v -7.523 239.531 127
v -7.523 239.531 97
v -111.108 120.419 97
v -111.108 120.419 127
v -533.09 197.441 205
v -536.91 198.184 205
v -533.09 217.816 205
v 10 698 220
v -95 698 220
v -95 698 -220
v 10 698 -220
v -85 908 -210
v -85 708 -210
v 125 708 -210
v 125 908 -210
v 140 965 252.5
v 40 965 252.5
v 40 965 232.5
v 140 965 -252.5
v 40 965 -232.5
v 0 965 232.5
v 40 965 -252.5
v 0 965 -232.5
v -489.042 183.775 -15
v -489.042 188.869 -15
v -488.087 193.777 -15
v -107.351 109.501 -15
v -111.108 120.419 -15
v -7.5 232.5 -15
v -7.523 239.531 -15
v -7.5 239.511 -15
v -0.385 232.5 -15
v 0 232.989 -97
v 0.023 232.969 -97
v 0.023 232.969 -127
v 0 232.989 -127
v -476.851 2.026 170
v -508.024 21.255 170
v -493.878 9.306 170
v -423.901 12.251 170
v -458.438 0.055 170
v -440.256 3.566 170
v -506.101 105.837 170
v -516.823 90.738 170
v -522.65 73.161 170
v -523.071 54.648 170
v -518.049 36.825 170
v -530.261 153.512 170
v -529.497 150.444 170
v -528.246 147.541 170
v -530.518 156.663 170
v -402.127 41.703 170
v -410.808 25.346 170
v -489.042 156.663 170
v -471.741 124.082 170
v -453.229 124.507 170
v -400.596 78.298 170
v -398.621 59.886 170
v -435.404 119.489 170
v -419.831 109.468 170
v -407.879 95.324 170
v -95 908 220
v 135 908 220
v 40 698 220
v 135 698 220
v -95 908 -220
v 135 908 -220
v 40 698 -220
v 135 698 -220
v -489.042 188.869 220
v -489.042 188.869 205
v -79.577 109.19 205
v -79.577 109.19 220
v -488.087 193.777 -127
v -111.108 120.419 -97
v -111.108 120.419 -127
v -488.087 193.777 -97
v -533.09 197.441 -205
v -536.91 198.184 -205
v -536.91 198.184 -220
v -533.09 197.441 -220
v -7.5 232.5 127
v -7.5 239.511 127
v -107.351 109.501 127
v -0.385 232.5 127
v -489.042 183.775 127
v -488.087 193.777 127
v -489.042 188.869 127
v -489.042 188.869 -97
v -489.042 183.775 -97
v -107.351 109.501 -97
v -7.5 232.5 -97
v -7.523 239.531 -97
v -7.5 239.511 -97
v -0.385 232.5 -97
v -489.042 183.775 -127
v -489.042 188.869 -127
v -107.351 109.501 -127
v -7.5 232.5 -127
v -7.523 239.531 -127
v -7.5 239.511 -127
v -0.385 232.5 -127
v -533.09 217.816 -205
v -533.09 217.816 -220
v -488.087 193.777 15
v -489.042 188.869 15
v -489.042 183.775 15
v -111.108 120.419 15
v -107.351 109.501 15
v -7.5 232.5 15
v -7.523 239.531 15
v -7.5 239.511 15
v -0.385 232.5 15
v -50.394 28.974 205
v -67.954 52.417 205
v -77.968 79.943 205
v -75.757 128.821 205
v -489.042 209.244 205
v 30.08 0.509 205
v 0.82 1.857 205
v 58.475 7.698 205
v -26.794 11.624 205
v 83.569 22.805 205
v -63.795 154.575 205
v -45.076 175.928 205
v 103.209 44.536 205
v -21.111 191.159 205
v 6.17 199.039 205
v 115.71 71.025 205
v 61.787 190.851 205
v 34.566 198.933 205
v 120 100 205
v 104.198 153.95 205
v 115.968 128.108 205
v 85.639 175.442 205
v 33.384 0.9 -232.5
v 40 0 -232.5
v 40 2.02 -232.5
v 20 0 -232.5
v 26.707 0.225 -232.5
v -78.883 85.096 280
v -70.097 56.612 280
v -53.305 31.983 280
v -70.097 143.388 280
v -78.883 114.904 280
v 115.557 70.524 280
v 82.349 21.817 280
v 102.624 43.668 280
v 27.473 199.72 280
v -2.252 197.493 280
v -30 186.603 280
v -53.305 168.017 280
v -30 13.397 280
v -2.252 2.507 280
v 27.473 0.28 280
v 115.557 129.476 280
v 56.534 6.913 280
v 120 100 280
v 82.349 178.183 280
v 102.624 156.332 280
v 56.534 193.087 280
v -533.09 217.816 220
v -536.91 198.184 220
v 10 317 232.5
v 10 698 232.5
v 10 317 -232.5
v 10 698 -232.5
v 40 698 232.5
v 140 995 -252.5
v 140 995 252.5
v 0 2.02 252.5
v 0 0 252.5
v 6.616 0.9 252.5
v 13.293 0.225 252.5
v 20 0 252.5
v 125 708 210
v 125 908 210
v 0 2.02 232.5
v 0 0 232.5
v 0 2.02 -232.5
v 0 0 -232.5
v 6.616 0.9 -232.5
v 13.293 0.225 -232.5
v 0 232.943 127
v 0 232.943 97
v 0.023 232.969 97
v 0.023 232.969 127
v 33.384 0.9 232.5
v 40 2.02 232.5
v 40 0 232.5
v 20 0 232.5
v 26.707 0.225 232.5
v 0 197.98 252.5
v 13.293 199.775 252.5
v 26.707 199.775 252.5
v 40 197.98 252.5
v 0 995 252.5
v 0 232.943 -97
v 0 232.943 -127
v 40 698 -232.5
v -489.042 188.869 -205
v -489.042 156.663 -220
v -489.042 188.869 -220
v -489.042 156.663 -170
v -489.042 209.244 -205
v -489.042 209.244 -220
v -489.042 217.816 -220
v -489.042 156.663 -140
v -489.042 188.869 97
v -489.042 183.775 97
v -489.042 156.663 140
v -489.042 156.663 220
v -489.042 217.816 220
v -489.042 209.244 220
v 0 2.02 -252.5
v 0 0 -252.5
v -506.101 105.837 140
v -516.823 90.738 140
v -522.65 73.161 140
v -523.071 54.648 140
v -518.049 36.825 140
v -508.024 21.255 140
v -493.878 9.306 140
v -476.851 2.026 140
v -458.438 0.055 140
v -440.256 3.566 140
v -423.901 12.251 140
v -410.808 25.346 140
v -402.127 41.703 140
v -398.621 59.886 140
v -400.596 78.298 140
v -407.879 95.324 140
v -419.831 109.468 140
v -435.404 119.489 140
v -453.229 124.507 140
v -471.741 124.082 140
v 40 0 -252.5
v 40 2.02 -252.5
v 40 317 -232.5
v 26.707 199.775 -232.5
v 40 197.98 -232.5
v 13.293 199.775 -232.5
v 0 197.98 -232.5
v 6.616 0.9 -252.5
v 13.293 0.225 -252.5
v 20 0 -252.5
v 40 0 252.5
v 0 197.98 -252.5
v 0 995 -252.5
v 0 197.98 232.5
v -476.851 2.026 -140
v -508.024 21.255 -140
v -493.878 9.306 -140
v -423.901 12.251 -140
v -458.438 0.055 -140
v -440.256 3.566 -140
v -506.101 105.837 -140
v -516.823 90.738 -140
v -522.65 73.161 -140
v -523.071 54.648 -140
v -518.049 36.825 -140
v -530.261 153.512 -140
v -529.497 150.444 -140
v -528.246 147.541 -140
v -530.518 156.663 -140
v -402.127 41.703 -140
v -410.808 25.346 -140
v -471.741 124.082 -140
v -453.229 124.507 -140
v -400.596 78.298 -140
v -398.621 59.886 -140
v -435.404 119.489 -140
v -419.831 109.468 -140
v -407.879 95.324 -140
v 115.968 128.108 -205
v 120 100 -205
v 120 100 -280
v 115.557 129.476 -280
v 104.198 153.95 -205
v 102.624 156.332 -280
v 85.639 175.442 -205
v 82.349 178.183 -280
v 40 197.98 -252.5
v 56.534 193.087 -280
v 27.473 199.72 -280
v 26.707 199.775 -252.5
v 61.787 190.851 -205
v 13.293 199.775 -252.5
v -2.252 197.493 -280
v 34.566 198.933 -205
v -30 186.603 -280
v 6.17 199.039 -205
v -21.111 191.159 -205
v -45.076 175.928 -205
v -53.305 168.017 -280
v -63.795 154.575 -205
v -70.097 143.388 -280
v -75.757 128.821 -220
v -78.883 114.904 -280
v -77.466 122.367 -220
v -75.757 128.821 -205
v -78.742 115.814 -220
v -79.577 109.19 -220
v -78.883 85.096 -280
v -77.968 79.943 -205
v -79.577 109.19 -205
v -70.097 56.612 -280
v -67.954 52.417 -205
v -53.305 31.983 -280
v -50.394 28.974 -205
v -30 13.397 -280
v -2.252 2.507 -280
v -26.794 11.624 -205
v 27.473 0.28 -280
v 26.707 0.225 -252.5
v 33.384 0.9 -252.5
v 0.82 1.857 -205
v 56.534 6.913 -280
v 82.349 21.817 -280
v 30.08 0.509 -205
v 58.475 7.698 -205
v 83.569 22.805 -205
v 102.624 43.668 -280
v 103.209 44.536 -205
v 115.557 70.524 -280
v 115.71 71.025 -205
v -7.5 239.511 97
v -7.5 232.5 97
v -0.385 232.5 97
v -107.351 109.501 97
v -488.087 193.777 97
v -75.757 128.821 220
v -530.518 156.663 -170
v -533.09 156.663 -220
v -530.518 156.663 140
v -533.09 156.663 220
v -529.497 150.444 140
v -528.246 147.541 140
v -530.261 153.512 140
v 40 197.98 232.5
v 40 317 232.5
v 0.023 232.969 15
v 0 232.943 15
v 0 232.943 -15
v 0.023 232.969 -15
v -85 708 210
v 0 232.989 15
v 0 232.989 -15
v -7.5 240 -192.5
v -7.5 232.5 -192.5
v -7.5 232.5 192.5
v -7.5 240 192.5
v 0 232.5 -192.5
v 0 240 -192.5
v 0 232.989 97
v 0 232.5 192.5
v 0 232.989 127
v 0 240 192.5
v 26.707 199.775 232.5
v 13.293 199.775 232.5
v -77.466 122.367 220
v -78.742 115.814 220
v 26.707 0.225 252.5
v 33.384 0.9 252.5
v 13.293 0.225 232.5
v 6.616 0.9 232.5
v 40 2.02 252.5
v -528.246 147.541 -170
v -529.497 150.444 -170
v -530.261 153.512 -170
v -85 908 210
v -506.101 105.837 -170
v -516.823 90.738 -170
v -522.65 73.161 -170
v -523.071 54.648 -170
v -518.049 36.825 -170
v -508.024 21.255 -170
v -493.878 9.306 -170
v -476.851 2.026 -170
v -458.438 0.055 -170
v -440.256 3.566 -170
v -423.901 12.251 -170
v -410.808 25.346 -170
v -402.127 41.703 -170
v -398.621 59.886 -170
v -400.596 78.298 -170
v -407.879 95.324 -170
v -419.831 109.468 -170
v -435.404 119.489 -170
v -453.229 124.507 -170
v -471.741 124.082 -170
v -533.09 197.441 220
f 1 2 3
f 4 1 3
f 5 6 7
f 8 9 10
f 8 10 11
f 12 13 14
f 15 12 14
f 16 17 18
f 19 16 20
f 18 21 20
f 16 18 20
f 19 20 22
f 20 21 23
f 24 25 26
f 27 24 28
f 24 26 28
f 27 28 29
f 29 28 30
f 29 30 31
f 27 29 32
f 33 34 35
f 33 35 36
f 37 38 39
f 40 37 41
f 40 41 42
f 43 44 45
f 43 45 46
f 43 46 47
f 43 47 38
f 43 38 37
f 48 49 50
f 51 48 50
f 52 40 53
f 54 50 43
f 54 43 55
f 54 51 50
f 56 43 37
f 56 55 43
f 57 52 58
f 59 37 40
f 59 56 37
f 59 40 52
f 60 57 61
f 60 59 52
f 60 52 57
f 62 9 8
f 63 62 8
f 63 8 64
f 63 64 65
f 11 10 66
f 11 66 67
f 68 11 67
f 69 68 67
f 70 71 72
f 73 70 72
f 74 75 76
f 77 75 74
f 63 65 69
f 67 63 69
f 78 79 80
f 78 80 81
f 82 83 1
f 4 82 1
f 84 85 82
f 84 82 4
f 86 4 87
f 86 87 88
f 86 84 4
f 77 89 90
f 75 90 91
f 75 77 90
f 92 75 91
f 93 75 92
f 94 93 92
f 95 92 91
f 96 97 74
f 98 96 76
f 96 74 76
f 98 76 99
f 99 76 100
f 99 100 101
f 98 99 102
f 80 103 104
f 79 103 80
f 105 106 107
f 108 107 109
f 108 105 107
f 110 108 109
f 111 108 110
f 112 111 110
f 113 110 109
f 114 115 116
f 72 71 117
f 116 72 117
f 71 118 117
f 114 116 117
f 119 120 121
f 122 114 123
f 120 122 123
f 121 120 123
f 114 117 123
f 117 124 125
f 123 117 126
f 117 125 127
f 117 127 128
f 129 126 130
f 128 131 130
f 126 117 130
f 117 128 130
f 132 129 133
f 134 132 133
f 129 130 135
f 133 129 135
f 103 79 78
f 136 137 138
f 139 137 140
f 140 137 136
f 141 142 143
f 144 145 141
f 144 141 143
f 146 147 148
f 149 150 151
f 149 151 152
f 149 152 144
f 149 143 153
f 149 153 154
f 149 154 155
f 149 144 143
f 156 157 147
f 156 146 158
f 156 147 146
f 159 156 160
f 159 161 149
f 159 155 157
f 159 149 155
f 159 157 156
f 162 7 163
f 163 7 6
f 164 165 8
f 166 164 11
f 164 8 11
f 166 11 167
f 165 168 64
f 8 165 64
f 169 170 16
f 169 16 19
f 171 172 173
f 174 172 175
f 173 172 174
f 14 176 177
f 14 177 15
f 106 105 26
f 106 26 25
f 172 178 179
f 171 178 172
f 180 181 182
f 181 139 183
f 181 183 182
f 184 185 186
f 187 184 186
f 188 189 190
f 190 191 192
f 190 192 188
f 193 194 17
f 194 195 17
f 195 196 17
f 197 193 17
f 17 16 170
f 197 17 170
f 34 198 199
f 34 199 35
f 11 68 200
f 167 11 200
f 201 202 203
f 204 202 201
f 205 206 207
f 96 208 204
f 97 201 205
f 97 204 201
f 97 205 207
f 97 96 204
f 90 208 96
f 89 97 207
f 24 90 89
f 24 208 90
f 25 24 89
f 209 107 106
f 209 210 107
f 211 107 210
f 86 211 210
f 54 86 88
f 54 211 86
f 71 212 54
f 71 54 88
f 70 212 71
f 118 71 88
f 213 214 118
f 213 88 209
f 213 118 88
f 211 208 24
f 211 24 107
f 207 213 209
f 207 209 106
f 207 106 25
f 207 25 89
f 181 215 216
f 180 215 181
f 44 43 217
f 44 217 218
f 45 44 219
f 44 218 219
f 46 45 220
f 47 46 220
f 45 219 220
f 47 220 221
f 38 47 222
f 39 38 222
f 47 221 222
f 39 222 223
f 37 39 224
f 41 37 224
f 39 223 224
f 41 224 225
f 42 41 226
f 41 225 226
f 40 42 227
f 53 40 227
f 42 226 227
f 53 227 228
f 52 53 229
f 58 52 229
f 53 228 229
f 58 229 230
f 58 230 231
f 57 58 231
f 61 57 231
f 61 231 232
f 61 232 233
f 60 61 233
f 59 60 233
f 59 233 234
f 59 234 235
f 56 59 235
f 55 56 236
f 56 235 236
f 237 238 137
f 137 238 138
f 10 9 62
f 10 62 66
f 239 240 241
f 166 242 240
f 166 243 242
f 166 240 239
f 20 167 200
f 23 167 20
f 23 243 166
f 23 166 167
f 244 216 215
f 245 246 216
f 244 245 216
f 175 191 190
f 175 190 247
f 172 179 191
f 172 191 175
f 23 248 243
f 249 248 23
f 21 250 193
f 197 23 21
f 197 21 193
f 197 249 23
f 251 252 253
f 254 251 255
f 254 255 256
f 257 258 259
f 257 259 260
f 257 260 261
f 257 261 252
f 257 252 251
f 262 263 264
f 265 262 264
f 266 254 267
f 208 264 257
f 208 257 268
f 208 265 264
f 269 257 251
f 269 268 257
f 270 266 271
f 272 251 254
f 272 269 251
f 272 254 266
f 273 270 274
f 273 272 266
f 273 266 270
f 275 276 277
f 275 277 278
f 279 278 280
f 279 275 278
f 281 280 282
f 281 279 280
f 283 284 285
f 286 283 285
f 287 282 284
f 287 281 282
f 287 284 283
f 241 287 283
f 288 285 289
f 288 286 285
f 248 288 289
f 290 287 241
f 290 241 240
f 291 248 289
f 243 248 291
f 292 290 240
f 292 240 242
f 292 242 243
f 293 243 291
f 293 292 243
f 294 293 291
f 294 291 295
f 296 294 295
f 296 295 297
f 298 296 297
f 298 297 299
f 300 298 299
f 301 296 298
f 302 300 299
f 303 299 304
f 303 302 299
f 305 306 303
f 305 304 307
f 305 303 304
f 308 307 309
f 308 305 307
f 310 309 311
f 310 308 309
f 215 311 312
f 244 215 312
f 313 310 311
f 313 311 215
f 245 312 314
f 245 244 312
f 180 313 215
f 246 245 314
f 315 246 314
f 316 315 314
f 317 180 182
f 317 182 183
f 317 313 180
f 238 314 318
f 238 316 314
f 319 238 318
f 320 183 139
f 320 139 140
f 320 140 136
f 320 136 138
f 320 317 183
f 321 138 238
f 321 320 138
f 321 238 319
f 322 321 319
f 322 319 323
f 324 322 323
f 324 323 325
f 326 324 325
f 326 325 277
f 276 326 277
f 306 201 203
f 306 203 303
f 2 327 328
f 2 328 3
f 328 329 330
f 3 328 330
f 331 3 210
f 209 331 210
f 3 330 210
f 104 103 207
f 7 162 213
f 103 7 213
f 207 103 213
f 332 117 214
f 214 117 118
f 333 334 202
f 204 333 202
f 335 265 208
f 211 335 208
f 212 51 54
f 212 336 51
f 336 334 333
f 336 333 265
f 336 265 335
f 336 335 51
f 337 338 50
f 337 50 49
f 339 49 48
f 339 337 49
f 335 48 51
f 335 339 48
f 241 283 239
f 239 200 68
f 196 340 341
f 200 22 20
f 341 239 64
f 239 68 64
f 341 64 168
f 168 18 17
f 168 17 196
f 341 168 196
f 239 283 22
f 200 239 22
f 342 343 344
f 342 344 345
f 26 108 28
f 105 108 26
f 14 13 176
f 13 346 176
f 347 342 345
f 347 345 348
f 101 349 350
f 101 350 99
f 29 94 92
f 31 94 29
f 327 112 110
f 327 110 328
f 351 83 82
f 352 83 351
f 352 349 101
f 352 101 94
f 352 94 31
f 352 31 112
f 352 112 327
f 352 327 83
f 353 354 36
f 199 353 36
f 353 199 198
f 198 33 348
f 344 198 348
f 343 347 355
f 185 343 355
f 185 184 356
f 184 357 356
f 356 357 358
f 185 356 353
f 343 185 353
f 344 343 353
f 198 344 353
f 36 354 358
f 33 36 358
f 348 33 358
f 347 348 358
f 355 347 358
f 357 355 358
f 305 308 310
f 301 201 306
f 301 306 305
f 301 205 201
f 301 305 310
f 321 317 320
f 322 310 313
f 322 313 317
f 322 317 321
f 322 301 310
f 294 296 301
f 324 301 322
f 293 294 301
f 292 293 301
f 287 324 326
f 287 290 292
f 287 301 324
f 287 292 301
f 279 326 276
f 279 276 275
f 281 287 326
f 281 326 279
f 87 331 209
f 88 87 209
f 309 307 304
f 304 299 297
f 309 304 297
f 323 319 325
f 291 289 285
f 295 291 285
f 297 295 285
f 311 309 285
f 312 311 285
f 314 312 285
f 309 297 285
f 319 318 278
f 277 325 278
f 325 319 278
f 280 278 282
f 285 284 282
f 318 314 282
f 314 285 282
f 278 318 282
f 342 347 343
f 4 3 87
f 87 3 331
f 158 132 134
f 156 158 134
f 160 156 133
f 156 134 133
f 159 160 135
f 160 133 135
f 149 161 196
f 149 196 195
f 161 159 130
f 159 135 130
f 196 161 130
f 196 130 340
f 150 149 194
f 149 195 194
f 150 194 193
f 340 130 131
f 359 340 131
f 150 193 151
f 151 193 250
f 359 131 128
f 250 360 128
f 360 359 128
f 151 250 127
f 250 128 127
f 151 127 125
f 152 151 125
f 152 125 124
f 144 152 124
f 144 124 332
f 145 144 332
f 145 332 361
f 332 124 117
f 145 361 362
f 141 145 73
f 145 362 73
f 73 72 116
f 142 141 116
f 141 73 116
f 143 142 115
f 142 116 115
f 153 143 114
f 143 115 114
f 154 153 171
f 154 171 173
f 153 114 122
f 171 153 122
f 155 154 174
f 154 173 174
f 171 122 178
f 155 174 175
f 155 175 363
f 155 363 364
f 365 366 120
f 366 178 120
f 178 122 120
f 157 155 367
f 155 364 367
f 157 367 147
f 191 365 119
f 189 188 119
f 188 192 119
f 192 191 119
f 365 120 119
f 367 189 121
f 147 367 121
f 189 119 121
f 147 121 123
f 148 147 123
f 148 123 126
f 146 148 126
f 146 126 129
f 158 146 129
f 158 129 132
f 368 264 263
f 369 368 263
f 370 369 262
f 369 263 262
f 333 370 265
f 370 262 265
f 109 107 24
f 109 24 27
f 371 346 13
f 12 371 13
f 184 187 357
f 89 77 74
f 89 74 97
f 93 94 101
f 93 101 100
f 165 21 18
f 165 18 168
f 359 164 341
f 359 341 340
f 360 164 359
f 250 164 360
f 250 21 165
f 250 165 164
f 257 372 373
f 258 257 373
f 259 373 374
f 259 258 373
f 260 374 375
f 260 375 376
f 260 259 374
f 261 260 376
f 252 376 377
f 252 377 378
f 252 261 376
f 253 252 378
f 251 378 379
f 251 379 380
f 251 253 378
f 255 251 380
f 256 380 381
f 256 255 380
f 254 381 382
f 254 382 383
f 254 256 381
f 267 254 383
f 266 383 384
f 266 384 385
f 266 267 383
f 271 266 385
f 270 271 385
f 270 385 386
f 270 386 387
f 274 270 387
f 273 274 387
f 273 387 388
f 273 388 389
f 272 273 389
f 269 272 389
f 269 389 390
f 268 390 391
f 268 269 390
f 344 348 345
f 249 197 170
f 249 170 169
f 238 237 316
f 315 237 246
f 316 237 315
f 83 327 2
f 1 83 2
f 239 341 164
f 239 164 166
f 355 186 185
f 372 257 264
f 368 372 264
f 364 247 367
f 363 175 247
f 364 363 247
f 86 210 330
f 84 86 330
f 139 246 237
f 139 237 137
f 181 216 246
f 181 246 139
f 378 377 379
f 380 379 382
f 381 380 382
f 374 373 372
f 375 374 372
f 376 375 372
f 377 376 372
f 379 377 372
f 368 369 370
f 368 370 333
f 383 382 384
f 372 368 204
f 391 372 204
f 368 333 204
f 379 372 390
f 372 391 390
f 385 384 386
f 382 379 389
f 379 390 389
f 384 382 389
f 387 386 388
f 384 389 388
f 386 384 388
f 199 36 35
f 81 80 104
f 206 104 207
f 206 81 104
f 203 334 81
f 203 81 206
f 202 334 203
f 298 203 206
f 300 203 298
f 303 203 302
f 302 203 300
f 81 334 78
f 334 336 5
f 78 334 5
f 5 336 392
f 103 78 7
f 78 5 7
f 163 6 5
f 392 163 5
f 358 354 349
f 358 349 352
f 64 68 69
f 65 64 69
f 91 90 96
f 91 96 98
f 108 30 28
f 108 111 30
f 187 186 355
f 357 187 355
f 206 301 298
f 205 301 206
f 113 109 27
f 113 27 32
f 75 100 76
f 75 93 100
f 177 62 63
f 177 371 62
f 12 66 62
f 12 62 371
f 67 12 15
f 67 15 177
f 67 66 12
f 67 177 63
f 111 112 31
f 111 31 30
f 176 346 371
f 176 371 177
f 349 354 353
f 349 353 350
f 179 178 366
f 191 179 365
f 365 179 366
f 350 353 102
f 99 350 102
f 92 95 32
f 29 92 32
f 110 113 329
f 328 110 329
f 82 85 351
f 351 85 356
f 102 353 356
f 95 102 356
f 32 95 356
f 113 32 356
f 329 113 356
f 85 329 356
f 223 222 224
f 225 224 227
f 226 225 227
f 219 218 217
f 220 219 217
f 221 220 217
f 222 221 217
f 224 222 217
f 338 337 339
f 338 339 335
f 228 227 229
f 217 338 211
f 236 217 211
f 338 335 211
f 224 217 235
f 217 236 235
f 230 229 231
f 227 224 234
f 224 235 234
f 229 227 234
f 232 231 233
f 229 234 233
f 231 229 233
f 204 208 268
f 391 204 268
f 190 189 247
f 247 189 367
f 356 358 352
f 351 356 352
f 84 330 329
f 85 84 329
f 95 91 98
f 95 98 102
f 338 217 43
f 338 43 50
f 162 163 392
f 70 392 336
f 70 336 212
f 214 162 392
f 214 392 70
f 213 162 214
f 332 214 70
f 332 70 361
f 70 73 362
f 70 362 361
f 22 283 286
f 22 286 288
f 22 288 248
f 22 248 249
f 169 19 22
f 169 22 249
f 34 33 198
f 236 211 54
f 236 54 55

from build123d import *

# Parameters (mm, degrees)
BOSS_EXTRUDE1_DEPTH  = 40
SKETCH3_W            = 505
SKETCH3_H            = 30
BOSS_EXTRUDE2_DEPTH  = 100
BOSS_EXTRUDE3_START  = 205
SKETCH5_R            = 100
BOSS_EXTRUDE3_DEPTH  = 75
BOSS_EXTRUDE4_START  = -205
SKETCH5_2_R          = 100
BOSS_EXTRUDE4_DEPTH  = 75
SKETCH7_W            = 505
SKETCH7_H            = 381
BOSS_EXTRUDE5_DEPTH  = 30
SKETCH8_W            = 230
SKETCH8_H            = 440
SKETCH8_W_2          = 210
SKETCH8_H_2          = 420
EXTRUDE_THIN1_DEPTH  = 210
SKETCH9_W            = 230
SKETCH9_H            = 440
BOSS_EXTRUDE6_DEPTH  = 10
SKETCH10_W           = 505
SKETCH10_H           = 7.5
BOSS_EXTRUDE7_DEPTH  = 7.5
BOSS_EXTRUDE8_START  = 205
BOSS_EXTRUDE8_DEPTH  = 15
BOSS_EXTRUDE9_START  = -205
BOSS_EXTRUDE9_DEPTH  = 15
BOSS_EXTRUDE10_REACH = 1238.243
SKETCH12_W           = 44.047720934
SKETCH12_H           = 61.152550191
BOSS_EXTRUDE11_START = 140
SKETCH13_R           = 62.5
BOSS_EXTRUDE11_DEPTH = 30
BOSS_EXTRUDE12_START = -140
SKETCH13_4_R         = 62.5
BOSS_EXTRUDE12_DEPTH = 30
EXTRUDE_THIN5_DEPTH  = 15
LPATTERN1_COUNT      = 2
LPATTERN1_PITCH      = 112
SKETCH15_W           = 7.5
SKETCH15_H           = 7.5
CUT_EXTRUDE1_DEPTH   = 60
MIRROR1_COPY_1_DEPTH = 15
MIRROR1_COPY_2_DEPTH = 15


with BuildPart() as part:
    # Sketch1 → Boss-Extrude1 (new body)
    with BuildSketch(Plane(origin=(0, 0, 0), x_dir=(0, 0, -1), z_dir=(1, 0, 0))):
        Polygon((-232.5, 0), (-252.5, 0), (-252.5, 995), (252.5, 995), (252.5, 0), (232.5, 0), (232.5, 965), (-232.5, 965), align=None)
    extrude(amount=BOSS_EXTRUDE1_DEPTH)

    # Sketch3 → Boss-Extrude2 (add)
    with BuildSketch(Plane(origin=(40, 0, 0), x_dir=(0, 0, -1), z_dir=(1, 0, 0))):
        with Locations((0, 980)):
            Rectangle(SKETCH3_W, SKETCH3_H)
    extrude(amount=BOSS_EXTRUDE2_DEPTH)

    # Sketch5<2> → Boss-Extrude4 (add)
    with BuildSketch(Plane.XY.offset(BOSS_EXTRUDE4_START)):
        with Locations((20, 100)):
            Circle(SKETCH5_2_R)
    extrude(amount=-BOSS_EXTRUDE4_DEPTH)

    # Sketch7 → Boss-Extrude5 (add)
    with BuildSketch(Plane(origin=(40, 0, 0), x_dir=(0, 0, -1), z_dir=(1, 0, 0))):
        with Locations((0, 507.5)):
            Rectangle(SKETCH7_W, SKETCH7_H)
    extrude(amount=-BOSS_EXTRUDE5_DEPTH)

    # Sketch8 → Extrude-Thin1 (add)
    with BuildSketch(Plane(origin=(0, 698, 0), x_dir=(1, 0, 0), z_dir=(0, 1, 0))):
        with Locations((20, 0)):
            Rectangle(SKETCH8_W, SKETCH8_H)
        with Locations((20, 0)):
            Rectangle(SKETCH8_W_2, SKETCH8_H_2, mode=Mode.SUBTRACT)
    extrude(amount=EXTRUDE_THIN1_DEPTH)

    # Sketch9 → Boss-Extrude6 (add)
    with BuildSketch(Plane.XZ.offset(-698)):
        with Locations((20, 0)):
            Rectangle(SKETCH9_W, SKETCH9_H)
    extrude(amount=-BOSS_EXTRUDE6_DEPTH)

    # Sketch10 → Boss-Extrude7 (add)
    with BuildSketch(Plane.ZY):
        with Locations((0, 236.25)):
            Rectangle(SKETCH10_W, SKETCH10_H)
    extrude(amount=BOSS_EXTRUDE7_DEPTH)


with BuildPart() as body_2:
    # Sketch5 → Boss-Extrude3 (new body)
    with BuildSketch(Plane.XY.offset(BOSS_EXTRUDE3_START)):
        with Locations((20, 100)):
            Circle(SKETCH5_R)
    extrude(amount=BOSS_EXTRUDE3_DEPTH)


    add(part.part)  # Boss-Extrude8 merges part
    # Sketch11 → Boss-Extrude8 (add)
    with BuildSketch(Plane.XY.offset(BOSS_EXTRUDE8_START)):
        Polygon((21.910116732, 109.815877652), (-533.089883268, 217.815877652), (-536.910116732, 198.184122348), (18.089883268, 90.184122348), align=None)
    extrude(amount=BOSS_EXTRUDE8_DEPTH)

    # Sketch11<2> → Boss-Extrude9 (add)
    with BuildSketch(Plane.XY.offset(BOSS_EXTRUDE9_START)):
        Polygon((21.910116732, 109.815877652), (-533.089883268, 217.815877652), (-536.910116732, 198.184122348), (18.089883268, 90.184122348), align=None)
    extrude(amount=-BOSS_EXTRUDE9_DEPTH)

    # Boss-Extrude10: up to this face of the body (flat: up to its plane)
    boss_extrude10_end = Plane(body_2.part.faces().sort_by_distance((-306.497442612, 163.534637481, -220))[0])
    # Sketch12 → Boss-Extrude10 (add, up to the picked face)
    with BuildSketch(Plane.XY.offset(220), mode=Mode.PRIVATE) as boss_extrude10_sk1:
        with Locations((-511.066022801, 187.239602557)):
            Rectangle(SKETCH12_W, SKETCH12_H)
    boss_extrude10_tool1 = split(extrude(boss_extrude10_sk1.sketch, amount=-BOSS_EXTRUDE10_REACH, mode=Mode.PRIVATE), bisect_by=boss_extrude10_end, keep=Keep.BOTH, mode=Mode.PRIVATE)
    add(boss_extrude10_tool1.solids().sort_by(Axis((-511.066023, 187.239603, 220), (0, 0, -1)))[0])

    # Sketch13 → Boss-Extrude11 (add)
    with BuildSketch(Plane.XY.offset(BOSS_EXTRUDE11_START)):
        with Locations((-461.066022801, 62.5)):
            Circle(SKETCH13_R)
        with BuildLine():
            Line((-493.886091971, 165.785738113), (-443.886091971, 71.622410652))
            ThreePointArc((-443.886091971, 71.622410652), (-451.943612148, 45.32006917), (-478.245953631, 53.377589348))
            Line((-478.245953631, 53.377589348), (-528.245953631, 147.540916809))
            ThreePointArc((-528.245953631, 147.540916809), (-520.188433453, 173.843258291), (-493.886091971, 165.785738113))
        make_face()
    extrude(amount=BOSS_EXTRUDE11_DEPTH)

    # Sketch13<4> → Boss-Extrude12 (add)
    with BuildSketch(Plane.XY.offset(BOSS_EXTRUDE12_START)):
        with Locations((-461.066022801, 62.5)):
            Circle(SKETCH13_4_R)
        with BuildLine():
            Line((-493.886091971, 165.785738113), (-443.886091971, 71.622410652))
            ThreePointArc((-443.886091971, 71.622410652), (-451.943612148, 45.32006917), (-478.245953631, 53.377589348))
            Line((-478.245953631, 53.377589348), (-528.245953631, 147.540916809))
            ThreePointArc((-528.245953631, 147.540916809), (-520.188433453, 173.843258291), (-493.886091971, 165.785738113))
        make_face()
    extrude(amount=-BOSS_EXTRUDE12_DEPTH)

    # Sketch14 → Extrude-Thin5 (add, symmetric)
    with BuildSketch(Plane.XY):
        Polygon((-7.52287052, 239.53107422), (-111.10842632, 120.419203046), (-488.087103968, 193.777215994), (-489.9972207, 183.961338343), (-107.351343448, 109.500518985), (0.02287052, 232.96892578), align=None)
    extrude_thin5 = extrude(amount=EXTRUDE_THIN5_DEPTH, both=True)

    # LPattern1: Extrude-Thin5 ×2
    with Locations(*[(0, 0, -i * LPATTERN1_PITCH) for i in range(1, LPATTERN1_COUNT)]):
        add(extrude_thin5)

    # Sketch15 → Cut-Extrude1 (cut)
    with BuildSketch(Plane(origin=(0, 0, -252.5), x_dir=(-1, 0, 0), z_dir=(0, 0, -1))):
        with Locations((3.75, 236.25)):
            Rectangle(SKETCH15_W, SKETCH15_H)
    cut_extrude1 = extrude(amount=-CUT_EXTRUDE1_DEPTH, mode=Mode.SUBTRACT)

    # Mirror1: Cut-Extrude1 across plane
    add(cut_extrude1.mirror(Plane.XY), mode=Mode.SUBTRACT)

    # Mirror1 copy 1 sketch → Mirror1 copy 1 (add, symmetric)
    with BuildSketch(Plane(origin=(0, 0, 112), x_dir=(1, 0, 0), z_dir=(0, 0, -1))):
        Polygon((-7.52287052, -239.53107422), (-111.10842632, -120.419203046), (-488.087103968, -193.777215994), (-489.9972207, -183.961338343), (-107.351343448, -109.500518985), (0.02287052, -232.96892578), align=None)
    extrude(amount=MIRROR1_COPY_1_DEPTH, both=True)

    # Mirror1 copy 2 sketch → Mirror1 copy 2 (add, symmetric)
    with BuildSketch(Plane(origin=(0, 0, 0), x_dir=(1, 0, 0), z_dir=(0, 0, -1))):
        Polygon((-7.52287052, -239.53107422), (-111.10842632, -120.419203046), (-488.087103968, -193.777215994), (-489.9972207, -183.961338343), (-107.351343448, -109.500518985), (0.02287052, -232.96892578), align=None)
    extrude(amount=MIRROR1_COPY_2_DEPTH, both=True)


solid = body_2.part
